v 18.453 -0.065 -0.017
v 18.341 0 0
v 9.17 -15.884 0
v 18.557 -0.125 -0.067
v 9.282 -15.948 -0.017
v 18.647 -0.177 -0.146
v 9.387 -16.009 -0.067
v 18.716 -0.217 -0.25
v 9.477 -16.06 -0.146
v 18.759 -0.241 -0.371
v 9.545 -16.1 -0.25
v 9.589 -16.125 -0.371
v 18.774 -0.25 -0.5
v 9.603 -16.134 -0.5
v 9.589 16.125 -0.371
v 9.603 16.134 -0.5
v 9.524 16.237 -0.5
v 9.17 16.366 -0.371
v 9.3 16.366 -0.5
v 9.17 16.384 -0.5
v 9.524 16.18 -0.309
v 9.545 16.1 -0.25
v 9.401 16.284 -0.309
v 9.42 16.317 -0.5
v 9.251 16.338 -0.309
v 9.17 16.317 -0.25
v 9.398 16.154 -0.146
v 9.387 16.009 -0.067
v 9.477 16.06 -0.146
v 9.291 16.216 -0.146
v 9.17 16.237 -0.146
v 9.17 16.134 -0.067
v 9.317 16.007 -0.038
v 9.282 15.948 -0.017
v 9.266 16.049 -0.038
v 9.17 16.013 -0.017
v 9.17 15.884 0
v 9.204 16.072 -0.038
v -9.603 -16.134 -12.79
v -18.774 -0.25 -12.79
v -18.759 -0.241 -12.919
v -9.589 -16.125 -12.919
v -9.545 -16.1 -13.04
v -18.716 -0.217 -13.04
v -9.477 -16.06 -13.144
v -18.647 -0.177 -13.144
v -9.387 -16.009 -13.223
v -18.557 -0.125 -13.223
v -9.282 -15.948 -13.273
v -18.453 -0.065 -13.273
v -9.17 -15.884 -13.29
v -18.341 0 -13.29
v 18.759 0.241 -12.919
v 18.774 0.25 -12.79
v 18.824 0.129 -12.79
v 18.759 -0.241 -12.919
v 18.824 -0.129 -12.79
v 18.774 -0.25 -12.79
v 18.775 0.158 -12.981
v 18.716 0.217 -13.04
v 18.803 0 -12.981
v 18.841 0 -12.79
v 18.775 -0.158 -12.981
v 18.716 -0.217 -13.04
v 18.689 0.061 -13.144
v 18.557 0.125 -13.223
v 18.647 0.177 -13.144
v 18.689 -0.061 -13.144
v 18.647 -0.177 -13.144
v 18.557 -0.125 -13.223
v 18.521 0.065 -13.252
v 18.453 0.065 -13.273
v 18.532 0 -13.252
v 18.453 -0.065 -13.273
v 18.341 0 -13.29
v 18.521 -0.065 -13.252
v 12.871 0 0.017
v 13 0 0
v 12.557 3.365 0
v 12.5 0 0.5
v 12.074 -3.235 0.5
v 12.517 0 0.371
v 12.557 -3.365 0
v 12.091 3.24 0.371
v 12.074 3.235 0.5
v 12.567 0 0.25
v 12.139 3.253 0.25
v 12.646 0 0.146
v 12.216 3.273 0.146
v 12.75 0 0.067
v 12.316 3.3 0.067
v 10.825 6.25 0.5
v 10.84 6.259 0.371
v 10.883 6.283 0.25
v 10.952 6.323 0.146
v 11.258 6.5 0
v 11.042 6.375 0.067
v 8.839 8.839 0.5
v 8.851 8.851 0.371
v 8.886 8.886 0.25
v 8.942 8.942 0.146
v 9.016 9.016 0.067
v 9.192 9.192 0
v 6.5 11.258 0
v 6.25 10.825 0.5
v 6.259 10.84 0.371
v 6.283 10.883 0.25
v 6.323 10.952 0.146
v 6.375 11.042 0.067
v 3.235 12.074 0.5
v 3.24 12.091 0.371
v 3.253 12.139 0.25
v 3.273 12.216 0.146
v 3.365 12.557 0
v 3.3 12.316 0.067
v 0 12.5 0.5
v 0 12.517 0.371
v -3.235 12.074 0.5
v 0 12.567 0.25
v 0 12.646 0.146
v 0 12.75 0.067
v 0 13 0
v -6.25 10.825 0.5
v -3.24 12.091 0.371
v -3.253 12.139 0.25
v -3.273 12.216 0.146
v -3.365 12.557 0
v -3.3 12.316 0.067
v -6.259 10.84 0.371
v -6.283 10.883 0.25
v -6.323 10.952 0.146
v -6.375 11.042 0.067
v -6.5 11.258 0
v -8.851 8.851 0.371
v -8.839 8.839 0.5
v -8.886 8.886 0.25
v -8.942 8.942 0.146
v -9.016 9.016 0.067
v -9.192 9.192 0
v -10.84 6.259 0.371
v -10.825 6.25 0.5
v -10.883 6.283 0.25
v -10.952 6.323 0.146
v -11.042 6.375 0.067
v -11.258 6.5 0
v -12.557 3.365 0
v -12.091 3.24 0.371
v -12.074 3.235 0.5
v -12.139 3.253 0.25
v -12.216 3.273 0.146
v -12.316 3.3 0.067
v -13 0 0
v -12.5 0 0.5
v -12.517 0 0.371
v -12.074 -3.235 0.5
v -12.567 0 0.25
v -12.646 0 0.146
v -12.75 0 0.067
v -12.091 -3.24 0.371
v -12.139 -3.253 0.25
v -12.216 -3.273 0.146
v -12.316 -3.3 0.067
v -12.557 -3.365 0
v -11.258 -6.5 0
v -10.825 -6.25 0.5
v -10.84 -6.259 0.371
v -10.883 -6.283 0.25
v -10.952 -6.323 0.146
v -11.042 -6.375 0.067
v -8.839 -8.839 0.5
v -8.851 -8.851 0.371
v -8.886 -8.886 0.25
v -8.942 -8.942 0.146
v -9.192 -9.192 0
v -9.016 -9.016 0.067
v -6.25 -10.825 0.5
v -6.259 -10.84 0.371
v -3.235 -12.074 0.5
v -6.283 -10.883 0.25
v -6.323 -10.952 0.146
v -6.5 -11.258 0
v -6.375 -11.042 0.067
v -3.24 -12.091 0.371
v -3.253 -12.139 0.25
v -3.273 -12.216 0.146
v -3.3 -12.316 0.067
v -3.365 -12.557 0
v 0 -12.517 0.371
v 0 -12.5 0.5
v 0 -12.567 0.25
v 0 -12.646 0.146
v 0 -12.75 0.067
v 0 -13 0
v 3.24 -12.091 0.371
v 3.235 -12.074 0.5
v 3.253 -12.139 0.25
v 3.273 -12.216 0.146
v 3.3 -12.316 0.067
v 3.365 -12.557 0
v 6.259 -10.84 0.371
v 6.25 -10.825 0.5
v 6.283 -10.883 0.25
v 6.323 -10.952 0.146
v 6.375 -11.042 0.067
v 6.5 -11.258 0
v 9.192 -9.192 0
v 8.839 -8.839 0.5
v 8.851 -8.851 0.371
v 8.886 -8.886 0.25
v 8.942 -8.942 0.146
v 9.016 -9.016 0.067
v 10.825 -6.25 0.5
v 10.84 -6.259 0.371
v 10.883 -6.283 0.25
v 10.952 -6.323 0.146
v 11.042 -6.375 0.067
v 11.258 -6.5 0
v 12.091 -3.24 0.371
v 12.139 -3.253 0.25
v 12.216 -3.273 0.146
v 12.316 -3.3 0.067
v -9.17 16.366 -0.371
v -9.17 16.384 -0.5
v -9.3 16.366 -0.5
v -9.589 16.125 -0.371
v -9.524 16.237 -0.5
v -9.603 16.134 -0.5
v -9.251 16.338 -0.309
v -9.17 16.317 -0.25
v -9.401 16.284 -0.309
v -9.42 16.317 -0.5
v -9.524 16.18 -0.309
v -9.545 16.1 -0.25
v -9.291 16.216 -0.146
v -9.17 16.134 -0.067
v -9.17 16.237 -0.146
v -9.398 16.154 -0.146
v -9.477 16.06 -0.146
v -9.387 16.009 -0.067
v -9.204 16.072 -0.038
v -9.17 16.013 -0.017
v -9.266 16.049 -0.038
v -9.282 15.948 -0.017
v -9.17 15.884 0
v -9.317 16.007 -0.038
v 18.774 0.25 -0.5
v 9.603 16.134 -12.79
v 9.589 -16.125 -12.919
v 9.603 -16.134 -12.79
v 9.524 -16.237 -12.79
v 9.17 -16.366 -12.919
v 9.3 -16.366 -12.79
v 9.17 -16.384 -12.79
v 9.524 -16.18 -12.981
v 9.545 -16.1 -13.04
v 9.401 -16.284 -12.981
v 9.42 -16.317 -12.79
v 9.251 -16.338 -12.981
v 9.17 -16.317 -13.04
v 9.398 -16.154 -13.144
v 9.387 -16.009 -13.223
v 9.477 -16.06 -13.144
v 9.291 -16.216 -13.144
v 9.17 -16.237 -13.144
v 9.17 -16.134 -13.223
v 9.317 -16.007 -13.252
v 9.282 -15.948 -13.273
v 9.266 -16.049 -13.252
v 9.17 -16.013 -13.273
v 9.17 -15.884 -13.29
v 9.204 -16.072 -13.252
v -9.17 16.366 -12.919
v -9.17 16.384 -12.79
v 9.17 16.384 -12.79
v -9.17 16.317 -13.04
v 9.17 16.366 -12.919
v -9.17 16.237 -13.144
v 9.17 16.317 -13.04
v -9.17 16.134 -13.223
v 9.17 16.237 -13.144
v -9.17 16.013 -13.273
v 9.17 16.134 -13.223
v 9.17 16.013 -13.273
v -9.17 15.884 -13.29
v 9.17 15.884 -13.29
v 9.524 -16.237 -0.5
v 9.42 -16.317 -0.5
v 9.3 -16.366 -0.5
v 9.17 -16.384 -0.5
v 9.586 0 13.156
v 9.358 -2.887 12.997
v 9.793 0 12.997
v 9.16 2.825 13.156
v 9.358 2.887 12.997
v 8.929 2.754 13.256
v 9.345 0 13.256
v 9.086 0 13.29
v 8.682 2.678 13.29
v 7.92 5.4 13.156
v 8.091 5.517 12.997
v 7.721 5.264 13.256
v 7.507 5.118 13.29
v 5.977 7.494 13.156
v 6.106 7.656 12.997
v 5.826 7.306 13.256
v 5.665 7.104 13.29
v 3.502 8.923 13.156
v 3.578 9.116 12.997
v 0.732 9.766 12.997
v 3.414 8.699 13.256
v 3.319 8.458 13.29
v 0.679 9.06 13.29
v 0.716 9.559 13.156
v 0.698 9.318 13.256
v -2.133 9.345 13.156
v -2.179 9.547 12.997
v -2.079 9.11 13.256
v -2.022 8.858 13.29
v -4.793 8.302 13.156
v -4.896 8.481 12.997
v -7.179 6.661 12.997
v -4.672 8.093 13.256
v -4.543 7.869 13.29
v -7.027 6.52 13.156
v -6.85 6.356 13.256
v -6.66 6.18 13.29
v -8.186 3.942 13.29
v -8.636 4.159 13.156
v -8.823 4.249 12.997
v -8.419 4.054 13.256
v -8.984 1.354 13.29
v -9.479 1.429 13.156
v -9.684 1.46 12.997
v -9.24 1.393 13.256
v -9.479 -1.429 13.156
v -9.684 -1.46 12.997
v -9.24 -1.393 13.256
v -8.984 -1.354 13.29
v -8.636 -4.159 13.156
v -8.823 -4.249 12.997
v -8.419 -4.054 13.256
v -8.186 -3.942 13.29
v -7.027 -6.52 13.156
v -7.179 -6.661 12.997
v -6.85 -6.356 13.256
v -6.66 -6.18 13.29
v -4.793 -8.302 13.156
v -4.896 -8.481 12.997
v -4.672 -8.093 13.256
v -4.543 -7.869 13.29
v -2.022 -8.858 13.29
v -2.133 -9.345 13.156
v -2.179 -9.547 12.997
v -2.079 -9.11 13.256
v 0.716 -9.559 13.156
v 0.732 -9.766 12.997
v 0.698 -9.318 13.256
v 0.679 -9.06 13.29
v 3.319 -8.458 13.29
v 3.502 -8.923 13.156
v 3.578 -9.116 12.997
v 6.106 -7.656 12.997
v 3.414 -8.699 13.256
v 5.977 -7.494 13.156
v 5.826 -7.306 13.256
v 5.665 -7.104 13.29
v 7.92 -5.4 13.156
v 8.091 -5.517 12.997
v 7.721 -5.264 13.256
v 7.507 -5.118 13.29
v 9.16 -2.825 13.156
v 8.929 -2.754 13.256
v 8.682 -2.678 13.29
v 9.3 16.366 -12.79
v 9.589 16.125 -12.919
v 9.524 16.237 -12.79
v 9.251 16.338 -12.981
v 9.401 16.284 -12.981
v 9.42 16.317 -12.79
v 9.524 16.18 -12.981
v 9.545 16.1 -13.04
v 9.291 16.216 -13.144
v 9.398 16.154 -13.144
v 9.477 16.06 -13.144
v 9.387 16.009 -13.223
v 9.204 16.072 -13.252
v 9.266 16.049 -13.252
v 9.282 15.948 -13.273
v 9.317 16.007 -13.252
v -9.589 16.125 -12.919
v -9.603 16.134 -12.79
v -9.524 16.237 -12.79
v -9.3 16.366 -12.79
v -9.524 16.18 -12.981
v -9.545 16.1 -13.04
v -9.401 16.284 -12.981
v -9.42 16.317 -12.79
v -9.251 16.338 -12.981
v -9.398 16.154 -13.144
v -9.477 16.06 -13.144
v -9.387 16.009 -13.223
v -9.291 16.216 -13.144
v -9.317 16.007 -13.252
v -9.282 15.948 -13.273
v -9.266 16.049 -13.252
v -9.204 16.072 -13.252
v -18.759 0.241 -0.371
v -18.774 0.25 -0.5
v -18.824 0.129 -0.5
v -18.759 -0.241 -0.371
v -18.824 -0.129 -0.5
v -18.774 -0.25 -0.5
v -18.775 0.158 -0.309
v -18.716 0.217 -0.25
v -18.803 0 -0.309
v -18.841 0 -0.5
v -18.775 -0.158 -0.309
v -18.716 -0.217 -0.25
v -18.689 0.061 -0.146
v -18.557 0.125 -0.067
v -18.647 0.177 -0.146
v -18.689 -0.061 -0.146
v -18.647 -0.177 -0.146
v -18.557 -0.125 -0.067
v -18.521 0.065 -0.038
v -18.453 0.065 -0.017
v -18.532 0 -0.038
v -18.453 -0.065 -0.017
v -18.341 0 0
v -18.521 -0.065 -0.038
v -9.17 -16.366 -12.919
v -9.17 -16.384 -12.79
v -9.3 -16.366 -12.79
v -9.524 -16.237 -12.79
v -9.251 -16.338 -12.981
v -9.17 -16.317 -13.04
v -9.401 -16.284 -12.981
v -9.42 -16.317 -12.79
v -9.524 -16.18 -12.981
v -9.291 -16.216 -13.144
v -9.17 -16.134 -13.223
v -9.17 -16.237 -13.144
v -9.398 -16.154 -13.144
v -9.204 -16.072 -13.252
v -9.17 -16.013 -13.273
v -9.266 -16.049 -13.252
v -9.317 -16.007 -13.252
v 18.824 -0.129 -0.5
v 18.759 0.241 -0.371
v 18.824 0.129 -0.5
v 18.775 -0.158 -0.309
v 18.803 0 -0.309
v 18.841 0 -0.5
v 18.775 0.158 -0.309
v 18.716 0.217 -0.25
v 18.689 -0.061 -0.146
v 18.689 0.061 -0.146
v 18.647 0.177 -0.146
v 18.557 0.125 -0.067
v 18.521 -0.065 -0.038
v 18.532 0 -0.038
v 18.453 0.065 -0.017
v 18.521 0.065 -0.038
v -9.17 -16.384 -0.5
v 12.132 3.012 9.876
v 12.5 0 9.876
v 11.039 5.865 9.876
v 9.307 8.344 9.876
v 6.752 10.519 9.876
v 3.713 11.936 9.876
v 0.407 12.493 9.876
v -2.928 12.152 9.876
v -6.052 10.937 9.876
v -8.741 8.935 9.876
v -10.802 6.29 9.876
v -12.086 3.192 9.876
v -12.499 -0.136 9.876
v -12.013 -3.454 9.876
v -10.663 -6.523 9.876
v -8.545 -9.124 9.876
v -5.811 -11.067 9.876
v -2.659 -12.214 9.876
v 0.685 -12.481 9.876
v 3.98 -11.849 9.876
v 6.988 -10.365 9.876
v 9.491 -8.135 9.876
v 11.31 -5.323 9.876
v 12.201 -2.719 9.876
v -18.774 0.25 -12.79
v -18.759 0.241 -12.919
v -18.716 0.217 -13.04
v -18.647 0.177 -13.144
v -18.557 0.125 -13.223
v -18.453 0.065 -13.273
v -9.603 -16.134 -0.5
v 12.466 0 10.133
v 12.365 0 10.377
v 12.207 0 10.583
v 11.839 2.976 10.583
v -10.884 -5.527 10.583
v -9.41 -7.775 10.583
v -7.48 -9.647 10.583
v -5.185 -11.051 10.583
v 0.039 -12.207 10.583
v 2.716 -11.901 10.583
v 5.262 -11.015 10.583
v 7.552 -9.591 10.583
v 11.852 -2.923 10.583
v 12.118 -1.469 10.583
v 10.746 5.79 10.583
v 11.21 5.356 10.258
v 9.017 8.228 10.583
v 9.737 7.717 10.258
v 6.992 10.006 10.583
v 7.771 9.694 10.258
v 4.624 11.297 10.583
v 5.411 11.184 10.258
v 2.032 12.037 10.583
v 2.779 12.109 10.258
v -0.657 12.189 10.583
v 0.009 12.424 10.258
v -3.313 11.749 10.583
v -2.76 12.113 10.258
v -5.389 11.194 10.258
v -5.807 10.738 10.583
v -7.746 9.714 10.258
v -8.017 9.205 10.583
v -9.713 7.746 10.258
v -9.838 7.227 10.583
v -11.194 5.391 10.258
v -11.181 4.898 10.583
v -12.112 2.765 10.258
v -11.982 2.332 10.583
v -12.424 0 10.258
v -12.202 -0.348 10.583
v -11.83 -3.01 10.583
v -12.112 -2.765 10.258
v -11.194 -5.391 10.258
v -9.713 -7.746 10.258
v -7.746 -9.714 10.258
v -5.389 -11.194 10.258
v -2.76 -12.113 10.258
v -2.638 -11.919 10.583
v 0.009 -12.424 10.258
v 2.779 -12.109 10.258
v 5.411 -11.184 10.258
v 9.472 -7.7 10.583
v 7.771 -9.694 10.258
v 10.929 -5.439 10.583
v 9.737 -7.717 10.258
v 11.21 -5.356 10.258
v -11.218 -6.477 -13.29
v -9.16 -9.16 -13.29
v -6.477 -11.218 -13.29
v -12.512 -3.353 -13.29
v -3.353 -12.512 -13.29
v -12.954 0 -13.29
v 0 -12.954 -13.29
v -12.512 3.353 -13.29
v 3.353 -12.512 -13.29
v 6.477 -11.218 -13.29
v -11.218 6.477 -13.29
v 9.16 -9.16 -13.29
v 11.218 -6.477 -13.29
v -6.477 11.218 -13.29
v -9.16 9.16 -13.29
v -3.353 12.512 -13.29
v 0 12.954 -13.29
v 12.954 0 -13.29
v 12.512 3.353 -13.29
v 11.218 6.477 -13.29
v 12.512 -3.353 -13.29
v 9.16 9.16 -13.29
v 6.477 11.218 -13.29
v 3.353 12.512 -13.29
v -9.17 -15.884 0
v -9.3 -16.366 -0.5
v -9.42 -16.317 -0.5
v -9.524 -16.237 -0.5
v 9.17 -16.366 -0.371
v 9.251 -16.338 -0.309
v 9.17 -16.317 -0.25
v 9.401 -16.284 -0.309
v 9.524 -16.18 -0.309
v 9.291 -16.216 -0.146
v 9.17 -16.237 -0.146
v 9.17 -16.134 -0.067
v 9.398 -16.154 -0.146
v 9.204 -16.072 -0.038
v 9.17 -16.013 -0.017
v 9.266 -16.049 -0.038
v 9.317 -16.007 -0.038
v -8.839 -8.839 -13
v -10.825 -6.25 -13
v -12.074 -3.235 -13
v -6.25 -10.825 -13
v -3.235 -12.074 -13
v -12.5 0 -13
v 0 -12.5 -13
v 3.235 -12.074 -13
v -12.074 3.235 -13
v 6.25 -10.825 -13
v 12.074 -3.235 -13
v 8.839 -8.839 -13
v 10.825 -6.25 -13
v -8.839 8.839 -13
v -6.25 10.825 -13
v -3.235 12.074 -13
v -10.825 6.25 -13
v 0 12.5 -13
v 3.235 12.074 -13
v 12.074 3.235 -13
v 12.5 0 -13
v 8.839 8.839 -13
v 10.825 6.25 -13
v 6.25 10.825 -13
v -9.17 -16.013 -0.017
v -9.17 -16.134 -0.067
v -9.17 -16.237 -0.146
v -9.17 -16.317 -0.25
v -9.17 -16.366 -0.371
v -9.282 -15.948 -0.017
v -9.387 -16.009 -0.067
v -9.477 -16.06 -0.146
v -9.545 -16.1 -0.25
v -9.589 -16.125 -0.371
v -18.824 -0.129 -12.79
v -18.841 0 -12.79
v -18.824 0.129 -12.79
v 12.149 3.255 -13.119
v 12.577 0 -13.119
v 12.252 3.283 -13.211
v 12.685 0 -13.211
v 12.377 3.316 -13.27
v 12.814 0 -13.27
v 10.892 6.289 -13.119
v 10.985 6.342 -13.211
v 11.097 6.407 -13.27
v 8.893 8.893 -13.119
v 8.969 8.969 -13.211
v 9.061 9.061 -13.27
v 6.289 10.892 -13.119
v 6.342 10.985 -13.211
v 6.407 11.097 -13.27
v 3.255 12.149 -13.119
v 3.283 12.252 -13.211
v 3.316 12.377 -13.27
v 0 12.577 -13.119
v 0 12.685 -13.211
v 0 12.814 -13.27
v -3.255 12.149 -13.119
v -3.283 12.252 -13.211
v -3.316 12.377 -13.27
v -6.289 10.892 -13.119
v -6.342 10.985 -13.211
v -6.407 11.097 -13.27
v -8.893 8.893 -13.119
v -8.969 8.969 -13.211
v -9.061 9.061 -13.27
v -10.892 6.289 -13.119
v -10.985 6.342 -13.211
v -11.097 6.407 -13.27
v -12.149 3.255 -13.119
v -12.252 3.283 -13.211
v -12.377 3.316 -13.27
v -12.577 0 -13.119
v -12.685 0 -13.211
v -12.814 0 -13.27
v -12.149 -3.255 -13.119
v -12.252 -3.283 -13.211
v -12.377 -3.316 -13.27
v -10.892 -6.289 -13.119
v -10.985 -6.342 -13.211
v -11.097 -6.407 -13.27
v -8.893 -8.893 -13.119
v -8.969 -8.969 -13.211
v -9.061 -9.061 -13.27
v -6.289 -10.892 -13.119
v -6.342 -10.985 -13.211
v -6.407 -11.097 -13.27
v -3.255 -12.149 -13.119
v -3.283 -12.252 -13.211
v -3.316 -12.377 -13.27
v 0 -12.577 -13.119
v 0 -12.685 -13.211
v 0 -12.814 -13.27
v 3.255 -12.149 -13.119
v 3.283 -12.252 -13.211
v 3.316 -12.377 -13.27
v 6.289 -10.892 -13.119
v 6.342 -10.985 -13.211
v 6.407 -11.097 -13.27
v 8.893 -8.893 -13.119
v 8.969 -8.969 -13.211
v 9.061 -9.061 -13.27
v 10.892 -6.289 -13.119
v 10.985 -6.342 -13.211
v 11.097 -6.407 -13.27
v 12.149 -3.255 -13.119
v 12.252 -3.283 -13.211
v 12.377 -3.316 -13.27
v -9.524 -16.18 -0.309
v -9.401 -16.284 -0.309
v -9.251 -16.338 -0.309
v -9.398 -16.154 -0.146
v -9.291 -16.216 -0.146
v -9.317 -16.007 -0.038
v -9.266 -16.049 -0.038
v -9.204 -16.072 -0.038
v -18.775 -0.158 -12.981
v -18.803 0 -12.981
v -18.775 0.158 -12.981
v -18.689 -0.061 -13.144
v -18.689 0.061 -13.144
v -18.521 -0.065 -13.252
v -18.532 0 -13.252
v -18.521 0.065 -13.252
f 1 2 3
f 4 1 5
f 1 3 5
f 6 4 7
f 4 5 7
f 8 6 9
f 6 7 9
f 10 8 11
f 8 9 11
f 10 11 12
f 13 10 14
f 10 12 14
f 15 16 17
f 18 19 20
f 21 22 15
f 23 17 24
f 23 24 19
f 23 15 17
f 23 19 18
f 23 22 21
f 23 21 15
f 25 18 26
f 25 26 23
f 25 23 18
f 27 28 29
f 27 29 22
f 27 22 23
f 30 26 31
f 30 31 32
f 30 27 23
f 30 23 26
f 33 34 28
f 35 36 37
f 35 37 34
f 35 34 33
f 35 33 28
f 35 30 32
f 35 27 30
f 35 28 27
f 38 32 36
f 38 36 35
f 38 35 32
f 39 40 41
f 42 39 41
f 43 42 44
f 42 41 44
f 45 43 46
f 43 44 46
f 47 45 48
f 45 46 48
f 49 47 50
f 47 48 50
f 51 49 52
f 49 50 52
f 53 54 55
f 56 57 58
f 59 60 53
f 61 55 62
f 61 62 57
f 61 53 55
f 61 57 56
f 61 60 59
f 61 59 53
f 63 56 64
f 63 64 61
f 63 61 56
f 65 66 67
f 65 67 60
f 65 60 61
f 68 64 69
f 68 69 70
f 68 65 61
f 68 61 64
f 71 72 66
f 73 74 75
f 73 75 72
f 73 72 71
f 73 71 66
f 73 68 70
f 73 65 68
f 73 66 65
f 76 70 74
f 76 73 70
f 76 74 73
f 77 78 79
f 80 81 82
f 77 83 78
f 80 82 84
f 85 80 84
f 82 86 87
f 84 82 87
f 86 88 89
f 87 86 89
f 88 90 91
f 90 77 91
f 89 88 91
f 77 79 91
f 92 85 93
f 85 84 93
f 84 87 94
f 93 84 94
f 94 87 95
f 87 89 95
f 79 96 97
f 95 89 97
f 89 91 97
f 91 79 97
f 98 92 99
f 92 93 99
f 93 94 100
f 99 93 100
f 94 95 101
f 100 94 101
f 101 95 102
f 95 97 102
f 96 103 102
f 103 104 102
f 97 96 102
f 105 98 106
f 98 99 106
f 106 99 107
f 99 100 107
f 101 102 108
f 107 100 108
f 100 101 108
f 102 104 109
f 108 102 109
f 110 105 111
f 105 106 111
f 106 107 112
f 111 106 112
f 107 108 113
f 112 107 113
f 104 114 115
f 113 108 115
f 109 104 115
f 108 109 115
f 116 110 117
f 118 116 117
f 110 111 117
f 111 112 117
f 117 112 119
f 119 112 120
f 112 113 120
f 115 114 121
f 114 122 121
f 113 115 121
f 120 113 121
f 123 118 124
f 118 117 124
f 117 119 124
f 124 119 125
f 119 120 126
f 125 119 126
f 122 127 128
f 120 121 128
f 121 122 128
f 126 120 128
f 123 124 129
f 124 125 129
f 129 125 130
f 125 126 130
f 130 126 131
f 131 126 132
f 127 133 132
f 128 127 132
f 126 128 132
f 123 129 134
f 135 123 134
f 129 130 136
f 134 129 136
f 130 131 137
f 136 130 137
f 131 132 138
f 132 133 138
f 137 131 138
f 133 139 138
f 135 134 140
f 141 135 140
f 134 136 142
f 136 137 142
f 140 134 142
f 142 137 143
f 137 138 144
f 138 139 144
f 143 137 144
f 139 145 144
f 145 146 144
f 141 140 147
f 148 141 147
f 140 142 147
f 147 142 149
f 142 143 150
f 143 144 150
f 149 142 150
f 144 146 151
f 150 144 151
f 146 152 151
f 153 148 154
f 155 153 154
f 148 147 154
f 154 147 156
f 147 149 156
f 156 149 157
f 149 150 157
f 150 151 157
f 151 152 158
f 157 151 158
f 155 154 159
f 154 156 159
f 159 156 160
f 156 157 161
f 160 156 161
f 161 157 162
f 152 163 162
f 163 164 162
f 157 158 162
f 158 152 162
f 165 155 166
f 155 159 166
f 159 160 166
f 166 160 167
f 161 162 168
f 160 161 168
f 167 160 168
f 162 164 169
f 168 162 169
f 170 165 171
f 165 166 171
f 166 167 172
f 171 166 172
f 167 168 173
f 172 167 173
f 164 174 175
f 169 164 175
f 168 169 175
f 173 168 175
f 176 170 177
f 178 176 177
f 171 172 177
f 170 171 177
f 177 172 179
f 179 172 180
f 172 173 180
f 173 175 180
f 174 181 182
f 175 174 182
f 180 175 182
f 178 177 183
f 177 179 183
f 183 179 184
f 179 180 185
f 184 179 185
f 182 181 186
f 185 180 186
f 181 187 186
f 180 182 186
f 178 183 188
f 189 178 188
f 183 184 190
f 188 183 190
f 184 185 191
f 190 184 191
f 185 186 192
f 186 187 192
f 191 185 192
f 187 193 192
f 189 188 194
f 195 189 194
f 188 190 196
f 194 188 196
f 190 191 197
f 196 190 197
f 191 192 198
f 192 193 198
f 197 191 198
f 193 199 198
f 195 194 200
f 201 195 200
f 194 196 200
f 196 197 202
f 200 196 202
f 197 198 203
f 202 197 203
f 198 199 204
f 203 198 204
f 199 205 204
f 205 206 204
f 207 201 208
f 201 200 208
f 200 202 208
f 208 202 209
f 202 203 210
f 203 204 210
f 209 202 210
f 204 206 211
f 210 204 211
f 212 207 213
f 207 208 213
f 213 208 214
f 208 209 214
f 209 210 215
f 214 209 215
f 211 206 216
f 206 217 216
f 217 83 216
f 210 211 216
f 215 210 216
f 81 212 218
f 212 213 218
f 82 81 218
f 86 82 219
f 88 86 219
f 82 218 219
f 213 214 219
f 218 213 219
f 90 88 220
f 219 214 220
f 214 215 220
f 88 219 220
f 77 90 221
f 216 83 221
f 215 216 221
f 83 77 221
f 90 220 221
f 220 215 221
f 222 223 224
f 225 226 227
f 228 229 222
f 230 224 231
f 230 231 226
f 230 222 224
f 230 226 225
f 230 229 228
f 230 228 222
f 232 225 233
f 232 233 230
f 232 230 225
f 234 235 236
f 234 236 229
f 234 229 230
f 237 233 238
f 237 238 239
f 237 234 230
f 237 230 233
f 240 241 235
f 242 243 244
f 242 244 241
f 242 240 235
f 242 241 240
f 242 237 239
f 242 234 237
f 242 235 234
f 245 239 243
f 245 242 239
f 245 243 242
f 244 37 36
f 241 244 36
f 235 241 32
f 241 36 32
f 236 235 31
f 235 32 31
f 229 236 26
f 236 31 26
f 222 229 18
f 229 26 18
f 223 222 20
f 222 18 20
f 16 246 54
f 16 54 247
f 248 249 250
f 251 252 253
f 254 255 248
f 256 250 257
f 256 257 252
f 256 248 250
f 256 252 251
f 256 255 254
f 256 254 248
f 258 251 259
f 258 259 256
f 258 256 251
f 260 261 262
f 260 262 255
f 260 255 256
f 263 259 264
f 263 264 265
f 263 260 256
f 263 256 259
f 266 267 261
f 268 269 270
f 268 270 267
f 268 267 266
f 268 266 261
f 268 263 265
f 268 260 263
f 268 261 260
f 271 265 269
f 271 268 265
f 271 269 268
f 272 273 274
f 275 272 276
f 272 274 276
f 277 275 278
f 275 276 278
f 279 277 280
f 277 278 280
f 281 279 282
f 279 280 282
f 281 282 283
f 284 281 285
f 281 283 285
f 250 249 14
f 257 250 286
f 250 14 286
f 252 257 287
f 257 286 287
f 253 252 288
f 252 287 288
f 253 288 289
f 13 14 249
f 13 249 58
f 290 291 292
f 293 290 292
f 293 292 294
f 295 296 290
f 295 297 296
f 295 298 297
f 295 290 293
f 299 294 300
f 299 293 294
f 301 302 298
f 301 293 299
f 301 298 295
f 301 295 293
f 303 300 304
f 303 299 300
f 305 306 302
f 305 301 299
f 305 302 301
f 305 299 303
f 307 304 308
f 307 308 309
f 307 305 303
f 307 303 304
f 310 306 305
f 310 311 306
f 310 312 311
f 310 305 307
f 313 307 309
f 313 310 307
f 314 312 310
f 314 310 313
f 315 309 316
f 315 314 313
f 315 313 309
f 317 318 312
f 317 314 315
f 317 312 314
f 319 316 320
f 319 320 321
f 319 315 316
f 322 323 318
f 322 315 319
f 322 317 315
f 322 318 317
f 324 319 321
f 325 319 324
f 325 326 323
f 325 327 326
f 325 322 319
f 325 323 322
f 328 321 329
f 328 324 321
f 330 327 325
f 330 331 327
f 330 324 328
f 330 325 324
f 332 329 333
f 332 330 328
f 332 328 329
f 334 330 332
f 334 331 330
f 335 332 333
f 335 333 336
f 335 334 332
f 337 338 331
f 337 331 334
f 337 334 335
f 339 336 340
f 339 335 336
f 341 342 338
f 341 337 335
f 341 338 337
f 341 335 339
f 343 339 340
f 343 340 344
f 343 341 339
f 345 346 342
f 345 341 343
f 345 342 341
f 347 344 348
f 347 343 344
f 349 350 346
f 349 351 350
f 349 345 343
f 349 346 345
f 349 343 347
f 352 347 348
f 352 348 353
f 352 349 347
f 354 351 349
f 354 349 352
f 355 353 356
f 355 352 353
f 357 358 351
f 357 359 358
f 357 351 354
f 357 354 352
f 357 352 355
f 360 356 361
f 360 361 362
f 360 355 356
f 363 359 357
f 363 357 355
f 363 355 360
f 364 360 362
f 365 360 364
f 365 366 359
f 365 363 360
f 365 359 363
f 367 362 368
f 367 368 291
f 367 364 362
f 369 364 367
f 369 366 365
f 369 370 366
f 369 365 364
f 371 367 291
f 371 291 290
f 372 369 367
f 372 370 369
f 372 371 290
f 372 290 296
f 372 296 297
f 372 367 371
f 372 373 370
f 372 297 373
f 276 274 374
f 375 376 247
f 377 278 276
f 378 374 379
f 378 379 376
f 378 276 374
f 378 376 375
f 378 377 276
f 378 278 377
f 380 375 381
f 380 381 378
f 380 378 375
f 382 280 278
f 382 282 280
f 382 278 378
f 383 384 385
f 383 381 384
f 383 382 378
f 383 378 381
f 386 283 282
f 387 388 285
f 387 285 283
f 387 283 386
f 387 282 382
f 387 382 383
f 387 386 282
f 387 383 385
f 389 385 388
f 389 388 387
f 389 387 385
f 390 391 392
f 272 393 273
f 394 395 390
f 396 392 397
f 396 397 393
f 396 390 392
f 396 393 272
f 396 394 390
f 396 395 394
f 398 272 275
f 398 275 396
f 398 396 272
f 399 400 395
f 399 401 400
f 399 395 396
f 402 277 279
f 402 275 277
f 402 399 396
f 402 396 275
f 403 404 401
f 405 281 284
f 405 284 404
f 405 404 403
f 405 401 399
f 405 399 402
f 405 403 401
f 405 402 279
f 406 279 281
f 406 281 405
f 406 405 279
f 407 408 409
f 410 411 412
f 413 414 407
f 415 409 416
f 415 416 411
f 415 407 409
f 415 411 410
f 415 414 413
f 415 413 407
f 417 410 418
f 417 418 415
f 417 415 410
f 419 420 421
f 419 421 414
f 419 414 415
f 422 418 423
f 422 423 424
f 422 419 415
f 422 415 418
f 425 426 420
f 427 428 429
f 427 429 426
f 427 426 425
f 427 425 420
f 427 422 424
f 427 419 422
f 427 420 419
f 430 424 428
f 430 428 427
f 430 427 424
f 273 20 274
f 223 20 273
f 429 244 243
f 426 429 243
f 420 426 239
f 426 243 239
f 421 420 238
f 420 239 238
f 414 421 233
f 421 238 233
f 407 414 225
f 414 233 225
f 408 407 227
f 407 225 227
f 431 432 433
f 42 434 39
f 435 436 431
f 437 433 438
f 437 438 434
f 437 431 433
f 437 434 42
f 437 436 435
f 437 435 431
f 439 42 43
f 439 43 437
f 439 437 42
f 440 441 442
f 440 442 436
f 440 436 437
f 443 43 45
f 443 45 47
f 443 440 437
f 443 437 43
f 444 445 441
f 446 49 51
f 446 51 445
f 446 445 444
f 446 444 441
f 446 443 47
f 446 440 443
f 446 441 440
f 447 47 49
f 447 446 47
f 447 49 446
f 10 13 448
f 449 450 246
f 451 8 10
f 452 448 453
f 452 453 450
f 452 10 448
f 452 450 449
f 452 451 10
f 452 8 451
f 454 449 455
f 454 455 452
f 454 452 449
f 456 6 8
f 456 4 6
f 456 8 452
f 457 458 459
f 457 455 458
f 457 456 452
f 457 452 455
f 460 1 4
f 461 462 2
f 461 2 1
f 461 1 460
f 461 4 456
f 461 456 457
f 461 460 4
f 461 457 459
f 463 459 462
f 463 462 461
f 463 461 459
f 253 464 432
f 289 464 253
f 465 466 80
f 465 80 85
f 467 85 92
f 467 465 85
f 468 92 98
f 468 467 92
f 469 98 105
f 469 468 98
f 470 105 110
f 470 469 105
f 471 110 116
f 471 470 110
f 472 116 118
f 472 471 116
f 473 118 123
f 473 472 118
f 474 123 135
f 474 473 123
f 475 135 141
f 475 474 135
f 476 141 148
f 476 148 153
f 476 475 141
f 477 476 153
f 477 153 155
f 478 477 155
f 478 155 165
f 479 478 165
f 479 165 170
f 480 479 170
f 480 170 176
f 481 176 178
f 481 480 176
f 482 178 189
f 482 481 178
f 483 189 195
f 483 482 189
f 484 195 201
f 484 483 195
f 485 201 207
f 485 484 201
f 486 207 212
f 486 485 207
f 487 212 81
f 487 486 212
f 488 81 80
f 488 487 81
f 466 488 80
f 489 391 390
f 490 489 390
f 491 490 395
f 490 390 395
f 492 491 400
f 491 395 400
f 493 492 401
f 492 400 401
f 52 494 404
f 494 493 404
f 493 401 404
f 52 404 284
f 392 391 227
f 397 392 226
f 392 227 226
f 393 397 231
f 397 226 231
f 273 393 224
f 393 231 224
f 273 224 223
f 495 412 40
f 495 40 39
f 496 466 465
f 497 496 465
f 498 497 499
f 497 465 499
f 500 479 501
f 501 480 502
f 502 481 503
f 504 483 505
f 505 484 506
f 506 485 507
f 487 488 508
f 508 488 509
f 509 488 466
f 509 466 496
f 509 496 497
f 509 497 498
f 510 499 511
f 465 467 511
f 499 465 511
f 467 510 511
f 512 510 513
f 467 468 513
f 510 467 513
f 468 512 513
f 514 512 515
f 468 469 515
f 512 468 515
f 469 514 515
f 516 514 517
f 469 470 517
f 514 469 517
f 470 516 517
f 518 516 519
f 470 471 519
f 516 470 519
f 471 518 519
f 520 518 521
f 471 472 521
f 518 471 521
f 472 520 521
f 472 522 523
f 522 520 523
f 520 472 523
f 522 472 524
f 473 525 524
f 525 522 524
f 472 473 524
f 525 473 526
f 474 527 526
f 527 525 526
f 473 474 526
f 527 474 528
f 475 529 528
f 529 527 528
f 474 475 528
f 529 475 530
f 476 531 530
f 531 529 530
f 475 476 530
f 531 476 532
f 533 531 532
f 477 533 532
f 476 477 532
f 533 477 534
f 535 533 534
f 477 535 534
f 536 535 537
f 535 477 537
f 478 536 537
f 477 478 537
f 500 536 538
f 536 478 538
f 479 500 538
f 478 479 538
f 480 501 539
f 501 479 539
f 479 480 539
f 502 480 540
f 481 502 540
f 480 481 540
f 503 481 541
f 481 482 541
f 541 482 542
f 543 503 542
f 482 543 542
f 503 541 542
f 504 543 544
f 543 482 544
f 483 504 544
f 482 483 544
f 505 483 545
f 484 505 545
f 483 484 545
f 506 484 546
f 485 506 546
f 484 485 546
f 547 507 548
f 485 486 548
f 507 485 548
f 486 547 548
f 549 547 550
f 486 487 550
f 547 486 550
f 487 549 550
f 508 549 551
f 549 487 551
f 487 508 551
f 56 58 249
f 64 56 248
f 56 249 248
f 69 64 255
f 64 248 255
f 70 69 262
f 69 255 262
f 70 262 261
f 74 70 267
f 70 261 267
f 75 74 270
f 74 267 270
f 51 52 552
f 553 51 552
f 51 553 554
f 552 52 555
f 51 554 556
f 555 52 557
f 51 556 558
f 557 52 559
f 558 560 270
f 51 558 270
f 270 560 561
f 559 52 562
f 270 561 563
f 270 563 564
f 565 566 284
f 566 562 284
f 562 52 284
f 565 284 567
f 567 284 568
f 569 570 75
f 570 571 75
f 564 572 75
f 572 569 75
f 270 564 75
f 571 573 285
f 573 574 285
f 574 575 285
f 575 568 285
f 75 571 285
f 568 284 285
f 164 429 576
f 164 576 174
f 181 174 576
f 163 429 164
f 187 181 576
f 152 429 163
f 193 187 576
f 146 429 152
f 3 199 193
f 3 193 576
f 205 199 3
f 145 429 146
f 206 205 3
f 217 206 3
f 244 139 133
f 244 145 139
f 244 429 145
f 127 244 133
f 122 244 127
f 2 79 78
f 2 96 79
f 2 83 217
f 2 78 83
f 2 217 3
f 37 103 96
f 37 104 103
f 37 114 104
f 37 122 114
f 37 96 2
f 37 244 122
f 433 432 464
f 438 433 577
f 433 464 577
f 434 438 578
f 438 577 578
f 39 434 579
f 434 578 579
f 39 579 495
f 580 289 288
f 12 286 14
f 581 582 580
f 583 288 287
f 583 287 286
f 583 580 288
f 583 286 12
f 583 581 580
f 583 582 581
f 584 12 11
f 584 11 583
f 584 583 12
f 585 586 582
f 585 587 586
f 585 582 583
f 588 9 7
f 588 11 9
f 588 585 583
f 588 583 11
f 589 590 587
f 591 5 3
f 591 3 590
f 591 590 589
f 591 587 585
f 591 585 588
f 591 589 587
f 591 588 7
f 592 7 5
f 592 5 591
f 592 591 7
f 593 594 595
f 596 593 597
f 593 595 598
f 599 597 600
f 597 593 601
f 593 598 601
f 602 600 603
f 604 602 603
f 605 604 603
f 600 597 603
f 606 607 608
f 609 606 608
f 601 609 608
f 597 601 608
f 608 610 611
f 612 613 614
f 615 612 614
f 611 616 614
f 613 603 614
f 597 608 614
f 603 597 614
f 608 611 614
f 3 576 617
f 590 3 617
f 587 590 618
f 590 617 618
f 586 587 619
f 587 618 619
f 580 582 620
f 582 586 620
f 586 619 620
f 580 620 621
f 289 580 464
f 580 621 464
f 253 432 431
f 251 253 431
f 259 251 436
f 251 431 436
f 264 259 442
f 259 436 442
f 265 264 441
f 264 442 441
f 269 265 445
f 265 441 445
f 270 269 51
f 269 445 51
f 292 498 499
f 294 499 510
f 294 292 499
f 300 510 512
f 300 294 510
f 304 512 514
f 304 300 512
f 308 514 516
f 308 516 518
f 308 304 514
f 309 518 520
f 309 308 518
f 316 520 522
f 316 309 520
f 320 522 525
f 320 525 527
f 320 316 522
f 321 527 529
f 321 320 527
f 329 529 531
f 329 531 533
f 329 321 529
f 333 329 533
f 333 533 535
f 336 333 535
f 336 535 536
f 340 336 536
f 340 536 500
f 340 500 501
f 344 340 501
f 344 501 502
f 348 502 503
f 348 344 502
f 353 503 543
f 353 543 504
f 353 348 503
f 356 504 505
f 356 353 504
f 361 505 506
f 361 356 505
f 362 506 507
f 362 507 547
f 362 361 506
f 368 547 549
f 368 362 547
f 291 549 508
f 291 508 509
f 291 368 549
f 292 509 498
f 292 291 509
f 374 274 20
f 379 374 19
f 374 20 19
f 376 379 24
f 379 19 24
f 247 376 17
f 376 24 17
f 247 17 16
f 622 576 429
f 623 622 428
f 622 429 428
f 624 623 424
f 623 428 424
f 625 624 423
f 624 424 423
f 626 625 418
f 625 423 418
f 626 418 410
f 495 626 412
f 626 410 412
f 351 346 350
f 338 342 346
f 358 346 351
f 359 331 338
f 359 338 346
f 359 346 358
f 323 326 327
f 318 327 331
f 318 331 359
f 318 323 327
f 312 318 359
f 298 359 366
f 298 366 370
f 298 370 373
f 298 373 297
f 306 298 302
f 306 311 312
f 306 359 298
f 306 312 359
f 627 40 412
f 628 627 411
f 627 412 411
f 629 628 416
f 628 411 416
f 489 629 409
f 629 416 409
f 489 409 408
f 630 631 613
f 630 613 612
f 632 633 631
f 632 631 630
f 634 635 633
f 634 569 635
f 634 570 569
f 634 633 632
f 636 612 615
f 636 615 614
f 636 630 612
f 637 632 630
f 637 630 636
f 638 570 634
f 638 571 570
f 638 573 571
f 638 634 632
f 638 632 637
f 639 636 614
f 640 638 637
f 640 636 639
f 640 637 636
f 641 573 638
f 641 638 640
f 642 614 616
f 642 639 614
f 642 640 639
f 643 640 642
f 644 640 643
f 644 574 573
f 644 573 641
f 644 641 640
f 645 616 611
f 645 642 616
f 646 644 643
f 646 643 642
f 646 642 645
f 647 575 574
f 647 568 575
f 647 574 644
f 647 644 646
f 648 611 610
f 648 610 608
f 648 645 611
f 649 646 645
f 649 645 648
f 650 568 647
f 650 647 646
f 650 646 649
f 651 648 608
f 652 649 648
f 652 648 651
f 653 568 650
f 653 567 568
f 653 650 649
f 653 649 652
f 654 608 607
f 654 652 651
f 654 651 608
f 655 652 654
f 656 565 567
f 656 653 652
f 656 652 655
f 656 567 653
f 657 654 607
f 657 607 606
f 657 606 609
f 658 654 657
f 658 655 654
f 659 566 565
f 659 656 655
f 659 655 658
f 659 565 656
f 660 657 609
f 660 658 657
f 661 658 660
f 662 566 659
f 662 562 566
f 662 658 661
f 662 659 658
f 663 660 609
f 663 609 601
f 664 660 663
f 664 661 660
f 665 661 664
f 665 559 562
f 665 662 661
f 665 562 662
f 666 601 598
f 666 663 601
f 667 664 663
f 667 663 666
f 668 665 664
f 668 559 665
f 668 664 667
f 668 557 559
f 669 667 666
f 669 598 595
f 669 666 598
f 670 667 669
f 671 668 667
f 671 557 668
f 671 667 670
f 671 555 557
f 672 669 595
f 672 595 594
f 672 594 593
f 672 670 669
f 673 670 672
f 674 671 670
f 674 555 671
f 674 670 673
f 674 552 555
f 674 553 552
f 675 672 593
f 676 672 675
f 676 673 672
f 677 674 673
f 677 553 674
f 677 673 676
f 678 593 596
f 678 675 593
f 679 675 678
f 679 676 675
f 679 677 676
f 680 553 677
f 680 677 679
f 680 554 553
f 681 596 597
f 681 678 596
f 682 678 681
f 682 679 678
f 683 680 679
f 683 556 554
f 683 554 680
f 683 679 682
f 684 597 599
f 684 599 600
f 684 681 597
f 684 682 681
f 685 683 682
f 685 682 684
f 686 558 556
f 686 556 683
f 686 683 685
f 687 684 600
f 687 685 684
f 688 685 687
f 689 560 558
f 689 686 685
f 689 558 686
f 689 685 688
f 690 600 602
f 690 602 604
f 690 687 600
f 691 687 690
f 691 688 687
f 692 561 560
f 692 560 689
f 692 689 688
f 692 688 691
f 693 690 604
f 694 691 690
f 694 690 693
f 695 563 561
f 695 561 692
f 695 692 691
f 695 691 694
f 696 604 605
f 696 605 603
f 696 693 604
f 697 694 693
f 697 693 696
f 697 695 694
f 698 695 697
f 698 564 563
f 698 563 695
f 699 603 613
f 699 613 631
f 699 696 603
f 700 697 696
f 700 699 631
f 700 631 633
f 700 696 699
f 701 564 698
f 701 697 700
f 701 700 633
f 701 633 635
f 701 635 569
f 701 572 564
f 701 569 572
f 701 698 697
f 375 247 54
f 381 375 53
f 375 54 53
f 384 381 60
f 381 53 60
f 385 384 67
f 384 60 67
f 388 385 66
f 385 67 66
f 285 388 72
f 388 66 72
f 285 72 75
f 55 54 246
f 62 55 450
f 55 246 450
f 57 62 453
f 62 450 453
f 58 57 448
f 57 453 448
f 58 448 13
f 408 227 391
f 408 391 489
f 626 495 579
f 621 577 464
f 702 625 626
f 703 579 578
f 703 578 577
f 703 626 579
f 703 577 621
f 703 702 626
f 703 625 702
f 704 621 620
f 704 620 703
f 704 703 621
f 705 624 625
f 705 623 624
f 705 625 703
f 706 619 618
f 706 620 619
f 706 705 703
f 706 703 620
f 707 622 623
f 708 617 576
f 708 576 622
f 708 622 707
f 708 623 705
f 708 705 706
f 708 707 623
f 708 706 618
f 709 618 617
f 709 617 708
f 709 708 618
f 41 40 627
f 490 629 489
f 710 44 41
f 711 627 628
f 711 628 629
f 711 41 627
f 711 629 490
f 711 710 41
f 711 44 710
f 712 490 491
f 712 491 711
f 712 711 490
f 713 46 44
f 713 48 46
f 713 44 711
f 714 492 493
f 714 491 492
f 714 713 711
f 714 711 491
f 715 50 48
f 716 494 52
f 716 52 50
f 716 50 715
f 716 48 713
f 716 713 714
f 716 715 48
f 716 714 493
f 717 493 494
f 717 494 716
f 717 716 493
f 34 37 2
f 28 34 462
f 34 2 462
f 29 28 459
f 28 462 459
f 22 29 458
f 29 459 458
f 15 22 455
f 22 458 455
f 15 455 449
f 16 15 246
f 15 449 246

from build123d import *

# Parameters (mm, degrees)
SKETCH1_R           = 12.5
BOSS_EXTRUDE1_DEPTH = 13.29
SKETCH2_R           = 12.5
BOSS_EXTRUDE2_DEPTH = 13
BOSS_EXTRUDE3_START = 13.29
SKETCH2_2_R         = 12.5
BOSS_EXTRUDE3_DEPTH = 13.29
CHAMFER1_SIZE       = 3
FILLET1_R           = 1
FILLET2_R           = 0.5
FILLET3_R           = 0.5


with BuildPart() as part:
    # Sketch1 → Boss-Extrude1 (new body)
    with BuildSketch(Plane.XY):
        Polygon((18.918054635, 0), (9.459027317, 16.383515904), (-9.459027317, 16.383515904), (-18.918054635, 0), (-9.459027317, -16.383515904), (9.459027317, -16.383515904), align=None)
        Circle(SKETCH1_R, mode=Mode.SUBTRACT)
    extrude(amount=-BOSS_EXTRUDE1_DEPTH)

    # Sketch2 → Boss-Extrude2 (add)
    with BuildSketch(Plane.XY):
        Circle(SKETCH2_R)
    extrude(amount=-BOSS_EXTRUDE2_DEPTH)

    # Sketch2<2> → Boss-Extrude3 (add)
    with BuildSketch(Plane.XY.offset(BOSS_EXTRUDE3_START)):
        Circle(SKETCH2_2_R)
    extrude(amount=-BOSS_EXTRUDE3_DEPTH)

    # Chamfer1
    chamfer1_edges = [part.edges().sort_by_distance(p)[0] for p in [
        (-12.5, 0, 13.29),
    ]]
    chamfer(chamfer1_edges, length=CHAMFER1_SIZE)

    # Fillet1
    fillet1_edges = [part.edges().sort_by_distance(p)[0] for p in [
        (-9.5, 0, 13.29),
        (-12.5, 0, 10.29),
    ]]
    fillet(fillet1_edges, radius=FILLET1_R)

    # Fillet2
    # the kernel refuses this fillet: 0.5 mm, written as the material it takes off along each edge
    with BuildSketch(Plane(origin=(9.170352183, -15.883515904, -0.5), x_dir=(0.866025403784439, -0.4999999999999994, 0), z_dir=(0, 0, 1))) as fillet2_piece_1_section:
        Polygon((0, 0), (FILLET2_R * 1.02, 0), (FILLET2_R * 1.02, -FILLET2_R * 0.588897274573), (FILLET2_R * 0.51, -FILLET2_R * 0.88334591186), align=None)
    fillet2_piece_1 = extrude(amount=FILLET2_R * 1.02, mode=Mode.PRIVATE)
    fillet2_piece_1 = fillet2_piece_1 - Plane(origin=(9.170352183, -15.883515904, -0.5), x_dir=(-0.5000000000000004, 0.8660254037844384, 0), z_dir=(0, 0, 1)) * Sphere(FILLET2_R, mode=Mode.PRIVATE)
    add(fillet2_piece_1, mode=Mode.SUBTRACT)
    with BuildSketch(Plane(origin=(9.170352183, -15.883515904, -12.79), x_dir=(0.866025403784439, -0.4999999999999994, 0), z_dir=(0, 0, -1))) as fillet2_piece_2_section:
        Polygon((0, 0), (FILLET2_R * 1.02, 0), (FILLET2_R * 1.02, FILLET2_R * 0.588897274573), (FILLET2_R * 0.51, FILLET2_R * 0.88334591186), align=None)
    fillet2_piece_2 = extrude(amount=FILLET2_R * 1.02, mode=Mode.PRIVATE)
    fillet2_piece_2 = fillet2_piece_2 - Plane(origin=(9.170352183, -15.883515904, -12.79), x_dir=(-0.5000000000000004, 0.8660254037844384, 0), z_dir=(0, 0, -1)) * Sphere(FILLET2_R, mode=Mode.PRIVATE)
    add(fillet2_piece_2, mode=Mode.SUBTRACT)
    with BuildSketch(Plane(origin=(-9.170352183, -15.883515904, -0.5), x_dir=(0, -1, 0), z_dir=(0, 0, 1))) as fillet2_piece_3_section:
        Polygon((0, 0), (FILLET2_R * 1.02, 0), (FILLET2_R * 1.02, -FILLET2_R * 0.588897274573), (FILLET2_R * 0.51, -FILLET2_R * 0.88334591186), align=None)
    fillet2_piece_3 = extrude(amount=FILLET2_R * 1.02, mode=Mode.PRIVATE)
    fillet2_piece_3 = fillet2_piece_3 - Plane(origin=(-9.170352183, -15.883515904, -0.5), x_dir=(0.49999999999999983, 0.8660254037844387, 0), z_dir=(0, 0, 1)) * Sphere(FILLET2_R, mode=Mode.PRIVATE)
    add(fillet2_piece_3, mode=Mode.SUBTRACT)
    with BuildSketch(Plane(origin=(-9.170352183, -15.883515904, -12.79), x_dir=(0, -1, 0), z_dir=(0, 0, -1))) as fillet2_piece_4_section:
        Polygon((0, 0), (FILLET2_R * 1.02, 0), (FILLET2_R * 1.02, FILLET2_R * 0.588897274573), (FILLET2_R * 0.51, FILLET2_R * 0.88334591186), align=None)
    fillet2_piece_4 = extrude(amount=FILLET2_R * 1.02, mode=Mode.PRIVATE)
    fillet2_piece_4 = fillet2_piece_4 - Plane(origin=(-9.170352183, -15.883515904, -12.79), x_dir=(0.49999999999999983, 0.8660254037844387, 0), z_dir=(0, 0, -1)) * Sphere(FILLET2_R, mode=Mode.PRIVATE)
    add(fillet2_piece_4, mode=Mode.SUBTRACT)
    with BuildSketch(Plane(origin=(-18.340704365, 0, -0.5), x_dir=(-0.8660254037844388, 0.49999999999999967, 0), z_dir=(0, 0, 1))) as fillet2_piece_5_section:
        Polygon((0, 0), (FILLET2_R * 1.02, 0), (FILLET2_R * 1.02, FILLET2_R * 0.588897274573), (FILLET2_R * 0.51, FILLET2_R * 0.88334591186), align=None)
    fillet2_piece_5 = extrude(amount=FILLET2_R * 1.02, mode=Mode.PRIVATE)
    fillet2_piece_5 = fillet2_piece_5 - Plane(origin=(-18.340704365, 0, -0.5), x_dir=(1, 0, 0), z_dir=(0, 0, 1)) * Sphere(FILLET2_R, mode=Mode.PRIVATE)
    add(fillet2_piece_5, mode=Mode.SUBTRACT)
    with BuildSketch(Plane(origin=(-18.340704365, 0, -12.79), x_dir=(-0.8660254037844388, 0.49999999999999967, 0), z_dir=(0, 0, -1))) as fillet2_piece_6_section:
        Polygon((0, 0), (FILLET2_R * 1.02, 0), (FILLET2_R * 1.02, -FILLET2_R * 0.588897274573), (FILLET2_R * 0.51, -FILLET2_R * 0.88334591186), align=None)
    fillet2_piece_6 = extrude(amount=FILLET2_R * 1.02, mode=Mode.PRIVATE)
    fillet2_piece_6 = fillet2_piece_6 - Plane(origin=(-18.340704365, 0, -12.79), x_dir=(1, 0, 0), z_dir=(0, 0, -1)) * Sphere(FILLET2_R, mode=Mode.PRIVATE)
    add(fillet2_piece_6, mode=Mode.SUBTRACT)
    with BuildSketch(Plane(origin=(-9.170352183, 15.883515904, -0.5), x_dir=(0, 1, 0), z_dir=(0, 0, 1))) as fillet2_piece_7_section:
        Polygon((0, 0), (FILLET2_R * 1.02, 0), (FILLET2_R * 1.02, FILLET2_R * 0.588897274573), (FILLET2_R * 0.51, FILLET2_R * 0.88334591186), align=None)
    fillet2_piece_7 = extrude(amount=FILLET2_R * 1.02, mode=Mode.PRIVATE)
    fillet2_piece_7 = fillet2_piece_7 - Plane(origin=(-9.170352183, 15.883515904, -0.5), x_dir=(0.5000000000000002, -0.8660254037844386, 0), z_dir=(0, 0, 1)) * Sphere(FILLET2_R, mode=Mode.PRIVATE)
    add(fillet2_piece_7, mode=Mode.SUBTRACT)
    with BuildSketch(Plane(origin=(-9.170352183, 15.883515904, -12.79), x_dir=(0, 1, 0), z_dir=(0, 0, -1))) as fillet2_piece_8_section:
        Polygon((0, 0), (FILLET2_R * 1.02, 0), (FILLET2_R * 1.02, -FILLET2_R * 0.588897274573), (FILLET2_R * 0.51, -FILLET2_R * 0.88334591186), align=None)
    fillet2_piece_8 = extrude(amount=FILLET2_R * 1.02, mode=Mode.PRIVATE)
    fillet2_piece_8 = fillet2_piece_8 - Plane(origin=(-9.170352183, 15.883515904, -12.79), x_dir=(0.5000000000000002, -0.8660254037844386, 0), z_dir=(0, 0, -1)) * Sphere(FILLET2_R, mode=Mode.PRIVATE)
    add(fillet2_piece_8, mode=Mode.SUBTRACT)
    with BuildSketch(Plane(origin=(9.170352183, 15.883515904, -0.5), x_dir=(0.8660254037844384, 0.5000000000000006, 0), z_dir=(0, 0, 1))) as fillet2_piece_9_section:
        Polygon((0, 0), (FILLET2_R * 1.02, 0), (FILLET2_R * 1.02, FILLET2_R * 0.588897274573), (FILLET2_R * 0.51, FILLET2_R * 0.88334591186), align=None)
    fillet2_piece_9 = extrude(amount=FILLET2_R * 1.02, mode=Mode.PRIVATE)
    fillet2_piece_9 = fillet2_piece_9 - Plane(origin=(9.170352183, 15.883515904, -0.5), x_dir=(-0.4999999999999997, -0.8660254037844387, 0), z_dir=(0, 0, 1)) * Sphere(FILLET2_R, mode=Mode.PRIVATE)
    add(fillet2_piece_9, mode=Mode.SUBTRACT)
    with BuildSketch(Plane(origin=(9.170352183, 15.883515904, -12.79), x_dir=(0.8660254037844384, 0.5000000000000006, 0), z_dir=(0, 0, -1))) as fillet2_piece_10_section:
        Polygon((0, 0), (FILLET2_R * 1.02, 0), (FILLET2_R * 1.02, -FILLET2_R * 0.588897274573), (FILLET2_R * 0.51, -FILLET2_R * 0.88334591186), align=None)
    fillet2_piece_10 = extrude(amount=FILLET2_R * 1.02, mode=Mode.PRIVATE)
    fillet2_piece_10 = fillet2_piece_10 - Plane(origin=(9.170352183, 15.883515904, -12.79), x_dir=(-0.4999999999999997, -0.8660254037844387, 0), z_dir=(0, 0, -1)) * Sphere(FILLET2_R, mode=Mode.PRIVATE)
    add(fillet2_piece_10, mode=Mode.SUBTRACT)
    with BuildSketch(Plane(origin=(18.340704365, 0, -0.5), x_dir=(0.8660254037844384, 0.5000000000000006, 0), z_dir=(0, 0, 1))) as fillet2_piece_11_section:
        Polygon((0, 0), (FILLET2_R * 1.02, 0), (FILLET2_R * 1.02, -FILLET2_R * 0.588897274573), (FILLET2_R * 0.51, -FILLET2_R * 0.88334591186), align=None)
    fillet2_piece_11 = extrude(amount=FILLET2_R * 1.02, mode=Mode.PRIVATE)
    fillet2_piece_11 = fillet2_piece_11 - Plane(origin=(18.340704365, 0, -0.5), x_dir=(-1, 0, 0), z_dir=(0, 0, 1)) * Sphere(FILLET2_R, mode=Mode.PRIVATE)
    add(fillet2_piece_11, mode=Mode.SUBTRACT)
    with BuildSketch(Plane(origin=(18.340704365, 0, -12.79), x_dir=(0.8660254037844384, 0.5000000000000006, 0), z_dir=(0, 0, -1))) as fillet2_piece_12_section:
        Polygon((0, 0), (FILLET2_R * 1.02, 0), (FILLET2_R * 1.02, FILLET2_R * 0.588897274573), (FILLET2_R * 0.51, FILLET2_R * 0.88334591186), align=None)
    fillet2_piece_12 = extrude(amount=FILLET2_R * 1.02, mode=Mode.PRIVATE)
    fillet2_piece_12 = fillet2_piece_12 - Plane(origin=(18.340704365, 0, -12.79), x_dir=(-1, 0, 0), z_dir=(0, 0, -1)) * Sphere(FILLET2_R, mode=Mode.PRIVATE)
    add(fillet2_piece_12, mode=Mode.SUBTRACT)
    with BuildSketch(Plane(origin=(9.459027317, -16.383515904, -0.5), x_dir=(0.499999999999998, 0.8660254037844398, 0), z_dir=(0, 0, -1)), Plane(origin=(-9.459027317, -16.383515904, -0.5), x_dir=(1, 0, 0), z_dir=(0, 0, -1)), Plane(origin=(18.918054635, 0, -0.5), x_dir=(-0.500000000000001, 0.8660254037844382, 0), z_dir=(0, 0, -1))) as fillet2_piece_13:
        with BuildLine():
            CenterArc((FILLET2_R * 0.57735026919, -FILLET2_R), FILLET2_R, 90, 60)
            Line((-FILLET2_R * 0.288675134595, -FILLET2_R * 0.5), (-FILLET2_R * 0.305995642671, -FILLET2_R * 0.49))
            Line((-FILLET2_R * 0.305995642671, -FILLET2_R * 0.49), (-FILLET2_R * 0.0115470053838, FILLET2_R * 0.02))
            Line((-FILLET2_R * 0.0115470053838, FILLET2_R * 0.02), (FILLET2_R * 0.57735026919, FILLET2_R * 0.02))
            Line((FILLET2_R * 0.57735026919, FILLET2_R * 0.02), (FILLET2_R * 0.57735026919, 0))
        make_face()
    extrude(amount=12.29, mode=Mode.SUBTRACT)
    with BuildSketch(Plane(origin=(-18.918054635, 0, -0.5), x_dir=(0.49999999999999345, 0.8660254037844424, 0), z_dir=(0, 0, -1)), Plane(origin=(-9.459027317, 16.383515904, -0.5), x_dir=(1, 0, 0), z_dir=(0, 0, -1)), Plane(origin=(9.459027317, 16.383515904, -0.5), x_dir=(0.499999999999998, -0.8660254037844398, 0), z_dir=(0, 0, -1))) as fillet2_piece_14:
        with BuildLine():
            CenterArc((FILLET2_R * 0.57735026919, FILLET2_R), FILLET2_R, 210, 60)
            Line((-FILLET2_R * 0.288675134595, FILLET2_R * 0.5), (-FILLET2_R * 0.30599564267, FILLET2_R * 0.49))
            Line((-FILLET2_R * 0.30599564267, FILLET2_R * 0.49), (-FILLET2_R * 0.0115470053838, -FILLET2_R * 0.02))
            Line((-FILLET2_R * 0.0115470053838, -FILLET2_R * 0.02), (FILLET2_R * 0.57735026919, -FILLET2_R * 0.02))
            Line((FILLET2_R * 0.57735026919, -FILLET2_R * 0.02), (FILLET2_R * 0.57735026919, 0))
        make_face()
    extrude(amount=12.29, mode=Mode.SUBTRACT)
    with BuildSketch(Plane(origin=(9.170352183, 16.383515904, -13.29), x_dir=(0, 0, 1), z_dir=(-1, 0, 0)), Plane(origin=(-9.603364885, 16.133515904, -13.29), x_dir=(0, 0, 1), z_dir=(-0.4999999999999997, -0.8660254037844389, 0)), Plane(origin=(-18.773717067, -0.25, -13.29), x_dir=(0, 0, 1), z_dir=(0.5000000000000002, -0.8660254037844386, 0)), Plane(origin=(-9.170352183, -16.383515904, -13.29), x_dir=(0, 0, 1), z_dir=(1, 0, 0)), Plane(origin=(9.603364885, -16.133515904, -13.29), x_dir=(0, 0, 1), z_dir=(0.4999999999999994, 0.866025403784439, 0)), Plane(origin=(-9.170352183, -16.383515904, 0), x_dir=(0, 1, 0), z_dir=(1, 0, 0)), Plane(origin=(-18.773717067, -0.25, 0), x_dir=(0.8660254037844386, 0.5000000000000002, 0), z_dir=(0.5000000000000002, -0.8660254037844386, 0)), Plane(origin=(-9.603364885, 16.133515904, 0), x_dir=(0.8660254037844388, -0.49999999999999967, 0), z_dir=(-0.4999999999999997, -0.8660254037844389, 0)), Plane(origin=(9.170352183, 16.383515904, 0), x_dir=(0, -1, 0), z_dir=(-1, 0, 0)), Plane(origin=(18.773717067, 0.25, 0), x_dir=(-0.8660254037844384, -0.5000000000000006, 0), z_dir=(-0.5000000000000006, 0.8660254037844384, 0)), Plane(origin=(9.603364885, -16.133515904, 0), x_dir=(-0.866025403784439, 0.49999999999999933, 0), z_dir=(0.4999999999999994, 0.866025403784439, 0)), Plane(origin=(18.773717067, 0.25, -13.29), x_dir=(0, 0, 1), z_dir=(-0.5000000000000006, 0.8660254037844384, 0))) as fillet2_piece_15:
        with BuildLine():
            CenterArc((FILLET2_R, -FILLET2_R), FILLET2_R, 90, 90)
            Line((0, -FILLET2_R), (-FILLET2_R * 0.02, -FILLET2_R))
            Line((-FILLET2_R * 0.02, -FILLET2_R), (-FILLET2_R * 0.02, FILLET2_R * 0.02))
            Line((-FILLET2_R * 0.02, FILLET2_R * 0.02), (FILLET2_R, FILLET2_R * 0.02))
            Line((FILLET2_R, FILLET2_R * 0.02), (FILLET2_R, 0))
        make_face()
    extrude(amount=18.340704365, mode=Mode.SUBTRACT)
    with BuildSketch(Plane(origin=(0, 0, -13.29), x_dir=(1, 0, 0), z_dir=(0, -1, 0))) as fillet2_piece_16:
        with BuildLine():
            CenterArc((12.953762052, 0.5), FILLET2_R, 204.83458749, 65.16541251)
            Line((12.5, 0.29), (12.490924759, 0.2858))
            ThreePointArc((12.490924759, 0.2858), (12.49, 0.145), (12.49, 0))
            Line((12.49, 0), (12.5, -0.01))
            Line((12.5, -0.01), (12.953762052, -0.01))
            Line((12.953762052, -0.01), (12.953762052, 0))
        make_face()
    revolve(axis=Axis((0, 0, -13.29), (0, 0, 1)), mode=Mode.SUBTRACT)

    # Fillet3
    fillet3_edges = [part.edges().sort_by_distance(p)[0] for p in [
        (-12.5, 0, 0),
    ]]
    fillet(fillet3_edges, radius=FILLET3_R)


solid = part.part
